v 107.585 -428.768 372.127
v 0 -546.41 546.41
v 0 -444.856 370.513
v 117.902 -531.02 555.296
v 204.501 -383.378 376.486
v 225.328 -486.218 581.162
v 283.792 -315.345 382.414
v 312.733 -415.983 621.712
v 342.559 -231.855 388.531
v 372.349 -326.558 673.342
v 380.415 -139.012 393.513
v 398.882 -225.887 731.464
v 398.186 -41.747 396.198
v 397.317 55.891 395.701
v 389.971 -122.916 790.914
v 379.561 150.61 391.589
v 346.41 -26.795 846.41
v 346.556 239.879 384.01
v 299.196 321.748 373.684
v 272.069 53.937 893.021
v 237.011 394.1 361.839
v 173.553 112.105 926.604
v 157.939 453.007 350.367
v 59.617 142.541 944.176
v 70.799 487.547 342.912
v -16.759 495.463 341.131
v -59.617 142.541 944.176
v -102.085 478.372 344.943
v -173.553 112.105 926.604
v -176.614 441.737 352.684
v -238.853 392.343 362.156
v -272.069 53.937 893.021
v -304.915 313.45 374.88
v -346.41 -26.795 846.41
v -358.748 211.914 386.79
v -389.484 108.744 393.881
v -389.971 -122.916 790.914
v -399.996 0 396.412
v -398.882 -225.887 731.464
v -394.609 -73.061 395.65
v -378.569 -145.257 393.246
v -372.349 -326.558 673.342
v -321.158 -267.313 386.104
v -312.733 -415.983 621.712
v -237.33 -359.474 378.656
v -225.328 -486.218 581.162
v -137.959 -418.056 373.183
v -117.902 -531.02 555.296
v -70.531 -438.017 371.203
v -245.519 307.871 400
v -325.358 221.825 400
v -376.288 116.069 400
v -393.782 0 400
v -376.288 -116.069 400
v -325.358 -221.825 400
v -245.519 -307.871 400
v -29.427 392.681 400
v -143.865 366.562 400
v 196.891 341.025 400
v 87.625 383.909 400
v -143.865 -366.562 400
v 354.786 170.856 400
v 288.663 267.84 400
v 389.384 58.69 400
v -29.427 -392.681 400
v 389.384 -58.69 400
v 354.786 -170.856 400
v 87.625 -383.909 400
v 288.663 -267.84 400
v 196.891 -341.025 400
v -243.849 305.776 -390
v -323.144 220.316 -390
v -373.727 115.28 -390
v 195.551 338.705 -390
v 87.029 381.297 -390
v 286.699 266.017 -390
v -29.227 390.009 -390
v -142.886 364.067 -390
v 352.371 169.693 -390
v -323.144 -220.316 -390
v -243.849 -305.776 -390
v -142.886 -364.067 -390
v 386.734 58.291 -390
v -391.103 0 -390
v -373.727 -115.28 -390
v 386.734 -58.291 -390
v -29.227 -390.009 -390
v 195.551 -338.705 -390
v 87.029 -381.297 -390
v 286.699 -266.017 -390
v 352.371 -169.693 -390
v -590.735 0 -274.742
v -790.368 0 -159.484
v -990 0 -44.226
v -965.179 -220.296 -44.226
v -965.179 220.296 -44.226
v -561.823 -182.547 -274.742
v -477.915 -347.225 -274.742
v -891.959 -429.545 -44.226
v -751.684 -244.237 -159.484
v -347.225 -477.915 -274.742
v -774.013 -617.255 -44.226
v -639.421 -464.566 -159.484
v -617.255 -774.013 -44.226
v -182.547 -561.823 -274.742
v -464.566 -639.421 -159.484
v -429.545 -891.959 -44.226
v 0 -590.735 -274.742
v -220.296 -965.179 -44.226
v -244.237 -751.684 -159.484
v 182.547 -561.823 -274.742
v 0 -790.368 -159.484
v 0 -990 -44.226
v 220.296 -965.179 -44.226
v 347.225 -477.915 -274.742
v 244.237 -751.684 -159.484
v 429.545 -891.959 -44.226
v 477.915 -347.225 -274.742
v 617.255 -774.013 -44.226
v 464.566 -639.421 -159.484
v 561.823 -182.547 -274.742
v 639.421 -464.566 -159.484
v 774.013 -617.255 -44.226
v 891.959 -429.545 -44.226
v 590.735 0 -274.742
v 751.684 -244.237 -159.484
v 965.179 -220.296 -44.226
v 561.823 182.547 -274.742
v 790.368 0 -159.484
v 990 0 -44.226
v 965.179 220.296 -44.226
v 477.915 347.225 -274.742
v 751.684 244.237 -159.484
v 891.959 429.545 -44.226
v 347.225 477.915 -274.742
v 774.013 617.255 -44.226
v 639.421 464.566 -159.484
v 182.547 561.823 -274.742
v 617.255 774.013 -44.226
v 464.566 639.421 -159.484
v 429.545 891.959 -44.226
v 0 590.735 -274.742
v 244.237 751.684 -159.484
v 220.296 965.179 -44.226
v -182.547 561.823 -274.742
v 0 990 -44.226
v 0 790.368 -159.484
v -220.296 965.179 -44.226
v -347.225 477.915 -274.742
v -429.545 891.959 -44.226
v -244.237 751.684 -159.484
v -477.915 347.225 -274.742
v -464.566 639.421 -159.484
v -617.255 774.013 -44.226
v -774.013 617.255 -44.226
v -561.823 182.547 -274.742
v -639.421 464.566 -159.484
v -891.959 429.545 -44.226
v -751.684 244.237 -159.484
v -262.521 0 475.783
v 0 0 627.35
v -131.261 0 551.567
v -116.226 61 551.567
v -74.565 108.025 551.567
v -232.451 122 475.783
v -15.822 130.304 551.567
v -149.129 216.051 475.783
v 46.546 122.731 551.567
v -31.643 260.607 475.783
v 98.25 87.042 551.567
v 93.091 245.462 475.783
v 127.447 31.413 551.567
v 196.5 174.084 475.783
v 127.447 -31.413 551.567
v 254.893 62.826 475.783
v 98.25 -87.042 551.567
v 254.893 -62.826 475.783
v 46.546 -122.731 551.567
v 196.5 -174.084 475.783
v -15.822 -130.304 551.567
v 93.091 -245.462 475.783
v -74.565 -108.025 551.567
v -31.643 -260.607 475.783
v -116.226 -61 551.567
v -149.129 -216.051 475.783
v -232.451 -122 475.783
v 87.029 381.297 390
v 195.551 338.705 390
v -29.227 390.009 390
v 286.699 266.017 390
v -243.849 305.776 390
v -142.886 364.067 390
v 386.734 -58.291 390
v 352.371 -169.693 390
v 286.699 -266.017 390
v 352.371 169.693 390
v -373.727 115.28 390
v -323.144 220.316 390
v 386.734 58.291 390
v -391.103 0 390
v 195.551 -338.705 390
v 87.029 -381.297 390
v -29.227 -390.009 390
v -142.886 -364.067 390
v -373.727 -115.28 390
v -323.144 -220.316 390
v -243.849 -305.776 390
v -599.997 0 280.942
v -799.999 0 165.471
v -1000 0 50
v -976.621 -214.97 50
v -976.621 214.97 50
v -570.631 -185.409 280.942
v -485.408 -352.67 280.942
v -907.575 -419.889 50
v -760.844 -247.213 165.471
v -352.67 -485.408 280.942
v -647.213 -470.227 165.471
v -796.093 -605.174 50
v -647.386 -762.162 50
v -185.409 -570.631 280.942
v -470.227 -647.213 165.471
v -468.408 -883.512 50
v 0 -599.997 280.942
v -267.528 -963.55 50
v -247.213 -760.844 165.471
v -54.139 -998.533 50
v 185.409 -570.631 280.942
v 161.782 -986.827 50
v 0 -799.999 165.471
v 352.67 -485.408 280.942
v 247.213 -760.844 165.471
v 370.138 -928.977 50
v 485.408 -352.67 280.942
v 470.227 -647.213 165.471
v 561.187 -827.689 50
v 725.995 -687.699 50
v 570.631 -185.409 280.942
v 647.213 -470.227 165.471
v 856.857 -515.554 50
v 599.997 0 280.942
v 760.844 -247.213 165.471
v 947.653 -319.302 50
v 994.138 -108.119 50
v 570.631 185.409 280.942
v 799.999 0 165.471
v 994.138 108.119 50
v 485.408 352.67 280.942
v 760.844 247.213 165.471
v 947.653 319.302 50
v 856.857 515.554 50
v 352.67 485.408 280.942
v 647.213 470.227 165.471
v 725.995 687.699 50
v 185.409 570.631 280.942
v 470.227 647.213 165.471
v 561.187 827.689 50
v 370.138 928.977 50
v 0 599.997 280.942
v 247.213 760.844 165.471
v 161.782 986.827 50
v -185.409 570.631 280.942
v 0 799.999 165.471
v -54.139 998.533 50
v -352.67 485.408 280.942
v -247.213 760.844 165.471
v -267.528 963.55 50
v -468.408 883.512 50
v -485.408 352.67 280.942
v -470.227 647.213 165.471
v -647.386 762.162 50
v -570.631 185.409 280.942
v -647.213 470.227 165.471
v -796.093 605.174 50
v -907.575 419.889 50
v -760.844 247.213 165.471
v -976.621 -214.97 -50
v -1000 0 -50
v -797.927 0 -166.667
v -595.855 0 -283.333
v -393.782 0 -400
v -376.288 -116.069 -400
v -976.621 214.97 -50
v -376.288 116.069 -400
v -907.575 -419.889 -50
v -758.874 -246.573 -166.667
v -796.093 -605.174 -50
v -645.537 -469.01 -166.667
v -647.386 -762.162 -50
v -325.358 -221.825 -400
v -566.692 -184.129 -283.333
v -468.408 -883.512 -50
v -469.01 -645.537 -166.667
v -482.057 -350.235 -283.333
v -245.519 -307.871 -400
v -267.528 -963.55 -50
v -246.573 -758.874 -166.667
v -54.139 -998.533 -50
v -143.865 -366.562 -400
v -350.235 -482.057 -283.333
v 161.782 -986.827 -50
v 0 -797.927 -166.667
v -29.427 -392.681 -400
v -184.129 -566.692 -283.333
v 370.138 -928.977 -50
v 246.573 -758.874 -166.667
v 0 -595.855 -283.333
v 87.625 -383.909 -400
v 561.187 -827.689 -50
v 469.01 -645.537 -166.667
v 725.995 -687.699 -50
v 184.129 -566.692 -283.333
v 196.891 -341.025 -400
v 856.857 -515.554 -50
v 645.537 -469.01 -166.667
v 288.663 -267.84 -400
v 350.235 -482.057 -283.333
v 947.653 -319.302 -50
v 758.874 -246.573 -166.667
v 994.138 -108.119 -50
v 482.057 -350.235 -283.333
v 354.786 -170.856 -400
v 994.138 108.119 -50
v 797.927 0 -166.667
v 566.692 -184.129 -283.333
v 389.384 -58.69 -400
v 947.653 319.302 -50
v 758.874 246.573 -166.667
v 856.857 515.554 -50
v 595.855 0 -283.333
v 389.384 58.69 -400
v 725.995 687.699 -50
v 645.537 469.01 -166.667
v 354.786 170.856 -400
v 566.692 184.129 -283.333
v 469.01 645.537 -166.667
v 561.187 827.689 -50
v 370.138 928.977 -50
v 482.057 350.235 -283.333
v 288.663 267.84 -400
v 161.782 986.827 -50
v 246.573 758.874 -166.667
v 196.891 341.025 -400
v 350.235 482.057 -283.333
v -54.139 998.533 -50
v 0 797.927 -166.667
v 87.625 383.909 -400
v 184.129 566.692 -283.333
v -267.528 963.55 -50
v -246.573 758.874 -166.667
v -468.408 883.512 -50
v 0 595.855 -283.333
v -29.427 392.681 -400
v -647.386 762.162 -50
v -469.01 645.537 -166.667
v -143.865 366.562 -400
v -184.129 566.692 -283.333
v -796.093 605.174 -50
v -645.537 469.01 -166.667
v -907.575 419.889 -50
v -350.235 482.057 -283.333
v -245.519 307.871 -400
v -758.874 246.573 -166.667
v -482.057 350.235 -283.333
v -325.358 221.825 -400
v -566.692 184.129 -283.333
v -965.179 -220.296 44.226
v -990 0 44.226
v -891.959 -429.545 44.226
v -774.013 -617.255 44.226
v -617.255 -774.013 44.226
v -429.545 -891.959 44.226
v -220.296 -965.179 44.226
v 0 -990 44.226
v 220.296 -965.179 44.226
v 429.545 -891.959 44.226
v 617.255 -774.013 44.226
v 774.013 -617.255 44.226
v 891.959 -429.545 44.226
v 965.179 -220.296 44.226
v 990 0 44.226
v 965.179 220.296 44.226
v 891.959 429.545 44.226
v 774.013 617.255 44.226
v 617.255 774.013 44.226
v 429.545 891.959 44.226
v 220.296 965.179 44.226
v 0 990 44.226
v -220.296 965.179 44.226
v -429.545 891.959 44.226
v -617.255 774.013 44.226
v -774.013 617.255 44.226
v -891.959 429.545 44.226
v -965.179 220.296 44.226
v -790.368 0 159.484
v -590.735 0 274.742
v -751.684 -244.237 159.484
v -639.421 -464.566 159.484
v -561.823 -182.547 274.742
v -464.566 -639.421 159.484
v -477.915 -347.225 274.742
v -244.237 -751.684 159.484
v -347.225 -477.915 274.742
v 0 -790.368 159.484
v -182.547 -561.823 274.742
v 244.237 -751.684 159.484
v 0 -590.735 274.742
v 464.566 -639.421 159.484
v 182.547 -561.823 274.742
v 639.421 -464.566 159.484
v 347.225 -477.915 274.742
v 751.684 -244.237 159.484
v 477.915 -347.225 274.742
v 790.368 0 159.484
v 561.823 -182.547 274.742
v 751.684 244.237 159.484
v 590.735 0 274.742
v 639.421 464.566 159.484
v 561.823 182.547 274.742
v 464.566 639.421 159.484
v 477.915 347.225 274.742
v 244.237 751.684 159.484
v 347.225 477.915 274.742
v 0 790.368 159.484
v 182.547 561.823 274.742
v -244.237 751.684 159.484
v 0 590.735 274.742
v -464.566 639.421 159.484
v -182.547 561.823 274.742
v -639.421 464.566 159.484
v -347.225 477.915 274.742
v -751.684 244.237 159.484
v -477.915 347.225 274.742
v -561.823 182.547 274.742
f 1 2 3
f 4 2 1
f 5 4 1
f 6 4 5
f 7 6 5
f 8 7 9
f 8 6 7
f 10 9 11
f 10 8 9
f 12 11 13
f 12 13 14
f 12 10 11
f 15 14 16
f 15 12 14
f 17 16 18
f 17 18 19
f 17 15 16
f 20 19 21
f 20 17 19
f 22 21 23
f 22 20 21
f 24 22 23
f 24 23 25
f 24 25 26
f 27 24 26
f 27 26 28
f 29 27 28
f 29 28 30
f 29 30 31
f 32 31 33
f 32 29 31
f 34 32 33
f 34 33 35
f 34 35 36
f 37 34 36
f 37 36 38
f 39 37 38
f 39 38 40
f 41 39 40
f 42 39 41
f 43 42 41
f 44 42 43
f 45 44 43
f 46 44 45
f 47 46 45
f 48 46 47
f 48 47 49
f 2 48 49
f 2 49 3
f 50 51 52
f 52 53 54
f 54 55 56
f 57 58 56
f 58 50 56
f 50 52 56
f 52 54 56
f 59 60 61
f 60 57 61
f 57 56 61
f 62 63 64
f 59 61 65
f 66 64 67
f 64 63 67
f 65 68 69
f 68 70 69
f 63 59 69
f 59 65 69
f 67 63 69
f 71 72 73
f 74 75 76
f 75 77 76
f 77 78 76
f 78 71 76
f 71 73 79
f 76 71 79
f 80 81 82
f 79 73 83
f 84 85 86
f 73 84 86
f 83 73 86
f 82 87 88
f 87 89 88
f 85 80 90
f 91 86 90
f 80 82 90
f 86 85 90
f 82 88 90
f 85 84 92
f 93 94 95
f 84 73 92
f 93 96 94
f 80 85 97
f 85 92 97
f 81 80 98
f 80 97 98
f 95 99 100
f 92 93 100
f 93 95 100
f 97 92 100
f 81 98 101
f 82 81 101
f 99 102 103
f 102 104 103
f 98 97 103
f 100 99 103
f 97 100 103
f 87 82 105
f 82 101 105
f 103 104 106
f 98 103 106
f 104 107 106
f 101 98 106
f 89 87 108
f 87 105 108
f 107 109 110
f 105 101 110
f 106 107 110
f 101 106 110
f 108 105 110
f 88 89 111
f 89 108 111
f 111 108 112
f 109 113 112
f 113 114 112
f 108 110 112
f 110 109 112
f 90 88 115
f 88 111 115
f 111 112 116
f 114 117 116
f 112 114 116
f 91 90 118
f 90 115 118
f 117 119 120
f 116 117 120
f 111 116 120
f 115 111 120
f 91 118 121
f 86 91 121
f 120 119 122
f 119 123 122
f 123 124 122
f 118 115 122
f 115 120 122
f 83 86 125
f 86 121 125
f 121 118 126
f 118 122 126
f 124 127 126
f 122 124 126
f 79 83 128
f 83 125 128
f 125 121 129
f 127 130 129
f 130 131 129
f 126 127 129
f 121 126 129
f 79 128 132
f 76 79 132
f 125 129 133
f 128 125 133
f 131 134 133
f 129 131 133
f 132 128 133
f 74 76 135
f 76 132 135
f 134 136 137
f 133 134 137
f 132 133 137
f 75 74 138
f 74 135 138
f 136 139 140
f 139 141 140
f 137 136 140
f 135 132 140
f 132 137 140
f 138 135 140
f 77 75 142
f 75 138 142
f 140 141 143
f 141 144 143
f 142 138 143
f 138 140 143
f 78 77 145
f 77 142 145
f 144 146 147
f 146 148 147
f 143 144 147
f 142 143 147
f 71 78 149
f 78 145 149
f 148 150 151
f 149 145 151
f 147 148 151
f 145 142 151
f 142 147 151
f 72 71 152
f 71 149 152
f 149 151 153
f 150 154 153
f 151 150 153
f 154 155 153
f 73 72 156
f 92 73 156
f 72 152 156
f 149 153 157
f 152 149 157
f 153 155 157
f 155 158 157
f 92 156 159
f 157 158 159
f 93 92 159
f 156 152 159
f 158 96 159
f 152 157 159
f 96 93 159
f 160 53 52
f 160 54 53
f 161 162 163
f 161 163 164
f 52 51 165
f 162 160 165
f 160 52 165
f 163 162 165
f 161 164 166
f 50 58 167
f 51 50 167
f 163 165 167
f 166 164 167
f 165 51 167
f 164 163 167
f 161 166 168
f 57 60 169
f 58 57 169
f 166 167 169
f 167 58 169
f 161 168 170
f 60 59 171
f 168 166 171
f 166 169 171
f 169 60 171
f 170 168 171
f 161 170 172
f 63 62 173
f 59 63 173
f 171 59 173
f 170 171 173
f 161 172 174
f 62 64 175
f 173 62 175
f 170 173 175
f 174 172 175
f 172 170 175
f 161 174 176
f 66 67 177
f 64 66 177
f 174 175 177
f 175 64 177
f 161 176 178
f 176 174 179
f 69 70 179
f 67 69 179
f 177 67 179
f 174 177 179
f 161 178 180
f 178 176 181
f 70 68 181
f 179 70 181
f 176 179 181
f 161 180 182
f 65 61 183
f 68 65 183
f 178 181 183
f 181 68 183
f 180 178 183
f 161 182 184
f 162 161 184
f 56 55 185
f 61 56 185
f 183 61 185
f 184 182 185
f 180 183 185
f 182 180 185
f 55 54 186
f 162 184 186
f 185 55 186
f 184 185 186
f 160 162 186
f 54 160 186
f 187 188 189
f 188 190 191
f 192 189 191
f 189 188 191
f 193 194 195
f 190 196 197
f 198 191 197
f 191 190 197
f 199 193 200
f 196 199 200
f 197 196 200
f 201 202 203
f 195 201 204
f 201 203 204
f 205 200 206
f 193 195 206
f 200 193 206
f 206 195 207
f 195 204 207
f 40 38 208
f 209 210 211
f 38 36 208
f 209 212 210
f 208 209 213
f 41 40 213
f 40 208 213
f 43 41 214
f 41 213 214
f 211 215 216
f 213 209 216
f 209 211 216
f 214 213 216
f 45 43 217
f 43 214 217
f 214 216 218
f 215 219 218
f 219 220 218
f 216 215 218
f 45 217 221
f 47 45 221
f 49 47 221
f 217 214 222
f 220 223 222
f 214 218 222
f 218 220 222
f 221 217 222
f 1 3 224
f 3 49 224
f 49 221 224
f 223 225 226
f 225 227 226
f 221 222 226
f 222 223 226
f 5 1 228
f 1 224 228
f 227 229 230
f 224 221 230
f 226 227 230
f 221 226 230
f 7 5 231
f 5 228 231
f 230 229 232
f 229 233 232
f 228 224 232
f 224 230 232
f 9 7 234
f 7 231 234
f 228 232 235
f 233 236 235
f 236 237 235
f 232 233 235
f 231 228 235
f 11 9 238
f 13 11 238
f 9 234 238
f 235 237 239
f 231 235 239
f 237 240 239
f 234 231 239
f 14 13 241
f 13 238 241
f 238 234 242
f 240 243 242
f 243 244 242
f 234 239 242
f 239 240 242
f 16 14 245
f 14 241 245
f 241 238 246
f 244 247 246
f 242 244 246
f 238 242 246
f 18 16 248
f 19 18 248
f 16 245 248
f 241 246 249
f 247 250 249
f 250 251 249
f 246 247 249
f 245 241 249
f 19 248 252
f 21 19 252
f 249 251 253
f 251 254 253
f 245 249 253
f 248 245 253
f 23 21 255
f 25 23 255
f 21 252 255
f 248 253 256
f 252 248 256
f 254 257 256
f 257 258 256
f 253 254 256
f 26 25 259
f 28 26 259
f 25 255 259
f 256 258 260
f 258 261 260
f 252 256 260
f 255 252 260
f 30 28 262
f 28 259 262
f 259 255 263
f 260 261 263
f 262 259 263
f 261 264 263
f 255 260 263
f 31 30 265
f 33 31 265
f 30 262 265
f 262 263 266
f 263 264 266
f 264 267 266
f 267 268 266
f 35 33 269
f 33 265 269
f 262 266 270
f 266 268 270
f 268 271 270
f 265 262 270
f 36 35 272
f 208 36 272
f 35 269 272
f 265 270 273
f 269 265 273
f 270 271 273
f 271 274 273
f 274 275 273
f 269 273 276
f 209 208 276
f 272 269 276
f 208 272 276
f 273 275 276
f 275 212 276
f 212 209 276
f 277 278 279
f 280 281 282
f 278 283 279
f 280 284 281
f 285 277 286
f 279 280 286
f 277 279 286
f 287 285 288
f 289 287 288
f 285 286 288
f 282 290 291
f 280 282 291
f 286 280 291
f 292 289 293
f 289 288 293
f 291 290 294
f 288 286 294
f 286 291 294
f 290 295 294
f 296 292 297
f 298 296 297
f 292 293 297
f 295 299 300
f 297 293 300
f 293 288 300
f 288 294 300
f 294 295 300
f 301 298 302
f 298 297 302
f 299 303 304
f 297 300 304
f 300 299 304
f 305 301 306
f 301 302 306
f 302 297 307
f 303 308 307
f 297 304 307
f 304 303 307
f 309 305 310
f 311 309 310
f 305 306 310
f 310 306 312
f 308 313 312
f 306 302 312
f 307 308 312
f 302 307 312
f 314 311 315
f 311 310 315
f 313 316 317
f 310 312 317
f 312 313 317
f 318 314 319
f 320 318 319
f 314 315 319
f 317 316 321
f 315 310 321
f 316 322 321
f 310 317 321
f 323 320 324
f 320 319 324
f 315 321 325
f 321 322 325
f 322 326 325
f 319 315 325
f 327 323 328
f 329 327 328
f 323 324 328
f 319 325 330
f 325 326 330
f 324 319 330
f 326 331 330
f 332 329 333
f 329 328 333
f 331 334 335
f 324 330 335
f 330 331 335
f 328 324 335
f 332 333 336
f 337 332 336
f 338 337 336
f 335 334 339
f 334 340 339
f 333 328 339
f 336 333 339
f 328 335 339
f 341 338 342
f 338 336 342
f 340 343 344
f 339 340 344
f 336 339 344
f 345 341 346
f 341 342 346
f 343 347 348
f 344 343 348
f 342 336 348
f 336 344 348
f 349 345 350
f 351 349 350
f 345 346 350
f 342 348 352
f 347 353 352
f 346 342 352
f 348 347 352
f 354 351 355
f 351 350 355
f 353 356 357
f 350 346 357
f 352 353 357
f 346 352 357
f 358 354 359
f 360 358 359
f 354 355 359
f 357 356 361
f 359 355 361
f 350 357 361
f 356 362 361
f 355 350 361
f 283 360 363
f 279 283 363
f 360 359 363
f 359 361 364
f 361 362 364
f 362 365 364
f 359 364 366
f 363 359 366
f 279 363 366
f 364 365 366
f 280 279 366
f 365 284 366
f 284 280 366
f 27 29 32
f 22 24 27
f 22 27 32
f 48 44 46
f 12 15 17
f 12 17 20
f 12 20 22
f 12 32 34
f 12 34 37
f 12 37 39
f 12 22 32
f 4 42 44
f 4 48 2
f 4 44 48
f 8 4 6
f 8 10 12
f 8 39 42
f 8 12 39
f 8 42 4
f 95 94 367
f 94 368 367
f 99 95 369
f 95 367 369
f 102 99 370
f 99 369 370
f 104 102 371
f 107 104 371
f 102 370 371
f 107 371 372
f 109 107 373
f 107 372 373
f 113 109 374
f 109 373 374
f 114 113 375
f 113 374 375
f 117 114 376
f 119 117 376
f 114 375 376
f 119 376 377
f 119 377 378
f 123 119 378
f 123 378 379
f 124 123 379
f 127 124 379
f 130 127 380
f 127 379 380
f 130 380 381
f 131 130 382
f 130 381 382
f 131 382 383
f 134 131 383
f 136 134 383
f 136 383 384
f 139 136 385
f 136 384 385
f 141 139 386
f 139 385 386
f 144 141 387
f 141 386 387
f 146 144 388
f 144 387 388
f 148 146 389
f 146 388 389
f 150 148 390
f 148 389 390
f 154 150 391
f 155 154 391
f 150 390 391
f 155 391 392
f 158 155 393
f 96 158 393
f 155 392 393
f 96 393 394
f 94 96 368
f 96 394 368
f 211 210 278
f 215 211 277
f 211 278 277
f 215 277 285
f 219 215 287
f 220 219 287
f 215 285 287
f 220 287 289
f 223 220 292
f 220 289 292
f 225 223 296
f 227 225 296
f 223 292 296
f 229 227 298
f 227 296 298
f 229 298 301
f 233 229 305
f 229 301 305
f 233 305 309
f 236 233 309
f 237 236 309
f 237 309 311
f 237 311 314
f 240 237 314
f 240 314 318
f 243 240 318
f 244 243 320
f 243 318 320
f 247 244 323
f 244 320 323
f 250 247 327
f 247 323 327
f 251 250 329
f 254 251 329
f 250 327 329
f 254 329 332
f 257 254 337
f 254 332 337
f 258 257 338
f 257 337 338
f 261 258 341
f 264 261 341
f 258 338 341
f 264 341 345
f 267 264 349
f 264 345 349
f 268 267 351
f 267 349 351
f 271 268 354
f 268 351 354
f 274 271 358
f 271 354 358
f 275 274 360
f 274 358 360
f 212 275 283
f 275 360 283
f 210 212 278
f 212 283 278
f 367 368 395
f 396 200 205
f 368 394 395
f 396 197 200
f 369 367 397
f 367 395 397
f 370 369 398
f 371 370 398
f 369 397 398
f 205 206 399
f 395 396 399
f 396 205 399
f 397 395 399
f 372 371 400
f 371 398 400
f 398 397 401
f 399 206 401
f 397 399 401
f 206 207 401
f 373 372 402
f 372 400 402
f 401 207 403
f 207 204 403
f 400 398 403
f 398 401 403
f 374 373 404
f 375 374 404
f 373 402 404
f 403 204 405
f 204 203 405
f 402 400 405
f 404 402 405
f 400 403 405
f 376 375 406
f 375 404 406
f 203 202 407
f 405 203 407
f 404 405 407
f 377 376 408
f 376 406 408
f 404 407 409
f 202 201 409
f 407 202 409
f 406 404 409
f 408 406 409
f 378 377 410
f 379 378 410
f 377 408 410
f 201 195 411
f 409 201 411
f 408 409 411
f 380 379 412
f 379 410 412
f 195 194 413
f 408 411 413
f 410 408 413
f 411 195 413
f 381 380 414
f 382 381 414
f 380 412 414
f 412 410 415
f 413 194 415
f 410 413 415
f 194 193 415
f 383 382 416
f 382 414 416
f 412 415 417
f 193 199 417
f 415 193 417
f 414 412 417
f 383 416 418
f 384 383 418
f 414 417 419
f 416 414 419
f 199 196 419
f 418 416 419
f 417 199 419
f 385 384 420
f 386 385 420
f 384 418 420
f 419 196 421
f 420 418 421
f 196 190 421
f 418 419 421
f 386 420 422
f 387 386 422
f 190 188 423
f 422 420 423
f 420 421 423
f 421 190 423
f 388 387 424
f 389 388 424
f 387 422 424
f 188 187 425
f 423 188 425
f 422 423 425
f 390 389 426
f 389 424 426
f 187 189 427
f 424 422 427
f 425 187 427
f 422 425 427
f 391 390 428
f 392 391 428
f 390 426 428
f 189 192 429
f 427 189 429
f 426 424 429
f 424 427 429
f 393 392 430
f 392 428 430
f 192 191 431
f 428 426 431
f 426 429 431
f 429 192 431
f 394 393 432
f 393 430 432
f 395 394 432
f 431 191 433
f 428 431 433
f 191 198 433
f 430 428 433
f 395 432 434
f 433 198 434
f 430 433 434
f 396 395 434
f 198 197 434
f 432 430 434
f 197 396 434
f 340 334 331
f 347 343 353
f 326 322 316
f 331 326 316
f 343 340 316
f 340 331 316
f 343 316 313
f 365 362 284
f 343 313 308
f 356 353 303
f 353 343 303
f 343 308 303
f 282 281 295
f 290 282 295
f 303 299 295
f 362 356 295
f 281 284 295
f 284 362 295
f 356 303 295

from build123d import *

# Parameters (mm, degrees)
BOSS_EXTRUDE1_REACH = 1997.161
SKETCH3_R           = 400


with BuildPart() as part:
    # Sketch2 → Revolve-Thin1 (revolve)
    with BuildSketch(Plane(origin=(0, 0, 0), x_dir=(1, 0, 0), z_dir=(0, 1, 0))):
        Polygon((0, -400), (-393.782217351, -400), (-1000, -50), (-1000, 50), (-393.782217351, 400), (0, 400), (0, 390), (-391.102725427, 390), (-990, 44.226497308), (-990, -44.226497308), (-391.102725427, -390), (0, -390), align=None)
    revolve(axis=Axis((0, 0, -819.038383134), (0, 0, 1)))

    # Boss-Extrude1: up to this cone (the profile starts outside it)
    boss_extrude1_end = Plane(origin=(0, 0, 746.410162), z_dir=(0, 0, -1)).offset(119.05989381) * Cone(1.732e-06, 3253.832564808, 1878.60110619, align=(Align.CENTER, Align.CENTER, Align.MIN), mode=Mode.PRIVATE)
    # Sketch3 → Boss-Extrude1 (add, up to the surface)
    with BuildSketch(Plane(origin=(0, -373.205080757, 646.410161514), x_dir=(1, 0, 0), z_dir=(0, -0.500000000000001, 0.866025403784438)), mode=Mode.PRIVATE) as boss_extrude1_sk1:
        with Locations(Location((0, 200, 0), (0, 0, 270))):
            Circle(SKETCH3_R)
    boss_extrude1_tool1 = extrude(boss_extrude1_sk1.sketch, amount=-BOSS_EXTRUDE1_REACH, mode=Mode.PRIVATE) - boss_extrude1_end
    add(boss_extrude1_tool1.solids().sort_by_distance((0, -200, 746.410162))[0])


solid = part.part
